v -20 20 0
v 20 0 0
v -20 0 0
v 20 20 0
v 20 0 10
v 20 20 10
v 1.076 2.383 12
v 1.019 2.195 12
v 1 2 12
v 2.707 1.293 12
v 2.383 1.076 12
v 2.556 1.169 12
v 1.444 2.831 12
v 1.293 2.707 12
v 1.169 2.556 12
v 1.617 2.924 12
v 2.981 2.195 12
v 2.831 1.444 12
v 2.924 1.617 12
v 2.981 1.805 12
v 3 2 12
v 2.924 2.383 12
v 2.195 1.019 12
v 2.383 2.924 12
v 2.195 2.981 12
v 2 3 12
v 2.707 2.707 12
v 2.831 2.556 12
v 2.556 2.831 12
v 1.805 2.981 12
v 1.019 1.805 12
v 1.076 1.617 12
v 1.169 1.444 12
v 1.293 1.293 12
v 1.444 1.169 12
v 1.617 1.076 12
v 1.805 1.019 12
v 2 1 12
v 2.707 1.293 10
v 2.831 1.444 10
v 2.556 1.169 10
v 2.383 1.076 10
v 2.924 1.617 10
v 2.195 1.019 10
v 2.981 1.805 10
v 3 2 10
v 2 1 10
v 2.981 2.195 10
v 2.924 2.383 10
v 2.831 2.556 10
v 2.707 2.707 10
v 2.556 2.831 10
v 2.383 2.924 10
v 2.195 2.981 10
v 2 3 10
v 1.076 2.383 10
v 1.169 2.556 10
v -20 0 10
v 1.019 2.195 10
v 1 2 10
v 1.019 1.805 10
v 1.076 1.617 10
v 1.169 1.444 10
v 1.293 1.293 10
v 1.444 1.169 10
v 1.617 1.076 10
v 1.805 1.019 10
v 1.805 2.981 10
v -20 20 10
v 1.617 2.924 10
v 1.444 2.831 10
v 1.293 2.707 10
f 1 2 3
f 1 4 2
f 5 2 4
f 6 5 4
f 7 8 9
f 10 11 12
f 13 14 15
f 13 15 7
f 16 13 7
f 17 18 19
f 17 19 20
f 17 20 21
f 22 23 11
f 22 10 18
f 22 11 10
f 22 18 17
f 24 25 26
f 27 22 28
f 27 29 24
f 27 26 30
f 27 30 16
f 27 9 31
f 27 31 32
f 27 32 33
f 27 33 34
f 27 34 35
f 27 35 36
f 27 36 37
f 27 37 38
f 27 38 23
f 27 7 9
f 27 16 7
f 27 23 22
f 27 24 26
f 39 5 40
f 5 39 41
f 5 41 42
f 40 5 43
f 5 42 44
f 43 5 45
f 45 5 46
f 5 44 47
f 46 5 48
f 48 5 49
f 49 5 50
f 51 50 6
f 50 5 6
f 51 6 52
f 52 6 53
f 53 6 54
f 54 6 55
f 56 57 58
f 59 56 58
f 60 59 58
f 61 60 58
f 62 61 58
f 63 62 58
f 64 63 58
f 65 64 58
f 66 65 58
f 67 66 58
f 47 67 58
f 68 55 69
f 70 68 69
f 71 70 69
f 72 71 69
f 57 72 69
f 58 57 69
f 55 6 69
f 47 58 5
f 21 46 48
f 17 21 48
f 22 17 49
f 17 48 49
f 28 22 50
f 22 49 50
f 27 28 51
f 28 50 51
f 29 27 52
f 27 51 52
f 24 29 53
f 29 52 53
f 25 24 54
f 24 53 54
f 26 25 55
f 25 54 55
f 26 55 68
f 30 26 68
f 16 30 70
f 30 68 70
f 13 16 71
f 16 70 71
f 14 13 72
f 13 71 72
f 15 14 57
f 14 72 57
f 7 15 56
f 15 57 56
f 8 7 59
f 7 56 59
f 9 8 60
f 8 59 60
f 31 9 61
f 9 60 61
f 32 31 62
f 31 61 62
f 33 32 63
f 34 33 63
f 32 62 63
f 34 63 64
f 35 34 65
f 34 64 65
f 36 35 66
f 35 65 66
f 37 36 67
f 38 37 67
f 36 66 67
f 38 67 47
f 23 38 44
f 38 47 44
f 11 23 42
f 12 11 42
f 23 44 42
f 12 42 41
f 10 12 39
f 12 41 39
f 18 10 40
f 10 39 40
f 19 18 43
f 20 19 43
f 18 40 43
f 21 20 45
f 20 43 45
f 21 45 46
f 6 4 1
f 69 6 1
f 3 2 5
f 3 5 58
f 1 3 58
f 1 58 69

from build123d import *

# Parameters (mm, degrees)
SKETCH_1_W     = 20
SKETCH_1_H     = 20
BASEBOX_DEPTH  = 10
SKETCH_2_R     = 1
BOSSSEED_DEPTH = 2


with BuildPart() as part:
    # 草图1 → BaseBox (new body)
    with BuildSketch(Plane.XY):
        with Locations((10, 10)):
            Rectangle(SKETCH_1_W, SKETCH_1_H)
    basebox = extrude(amount=BASEBOX_DEPTH)

    # 草图2 → BossSeed (add)
    with BuildSketch(Plane.XY.offset(10)):
        with Locations((2, 2)):
            Circle(SKETCH_2_R)
    extrude(amount=BOSSSEED_DEPTH)

    # Mirror 2: BaseBox across plane
    add(basebox.mirror(Plane(origin=(0, 0, 0), x_dir=(0, 0, 1), z_dir=(1, 0, 0))))


solid = part.part
